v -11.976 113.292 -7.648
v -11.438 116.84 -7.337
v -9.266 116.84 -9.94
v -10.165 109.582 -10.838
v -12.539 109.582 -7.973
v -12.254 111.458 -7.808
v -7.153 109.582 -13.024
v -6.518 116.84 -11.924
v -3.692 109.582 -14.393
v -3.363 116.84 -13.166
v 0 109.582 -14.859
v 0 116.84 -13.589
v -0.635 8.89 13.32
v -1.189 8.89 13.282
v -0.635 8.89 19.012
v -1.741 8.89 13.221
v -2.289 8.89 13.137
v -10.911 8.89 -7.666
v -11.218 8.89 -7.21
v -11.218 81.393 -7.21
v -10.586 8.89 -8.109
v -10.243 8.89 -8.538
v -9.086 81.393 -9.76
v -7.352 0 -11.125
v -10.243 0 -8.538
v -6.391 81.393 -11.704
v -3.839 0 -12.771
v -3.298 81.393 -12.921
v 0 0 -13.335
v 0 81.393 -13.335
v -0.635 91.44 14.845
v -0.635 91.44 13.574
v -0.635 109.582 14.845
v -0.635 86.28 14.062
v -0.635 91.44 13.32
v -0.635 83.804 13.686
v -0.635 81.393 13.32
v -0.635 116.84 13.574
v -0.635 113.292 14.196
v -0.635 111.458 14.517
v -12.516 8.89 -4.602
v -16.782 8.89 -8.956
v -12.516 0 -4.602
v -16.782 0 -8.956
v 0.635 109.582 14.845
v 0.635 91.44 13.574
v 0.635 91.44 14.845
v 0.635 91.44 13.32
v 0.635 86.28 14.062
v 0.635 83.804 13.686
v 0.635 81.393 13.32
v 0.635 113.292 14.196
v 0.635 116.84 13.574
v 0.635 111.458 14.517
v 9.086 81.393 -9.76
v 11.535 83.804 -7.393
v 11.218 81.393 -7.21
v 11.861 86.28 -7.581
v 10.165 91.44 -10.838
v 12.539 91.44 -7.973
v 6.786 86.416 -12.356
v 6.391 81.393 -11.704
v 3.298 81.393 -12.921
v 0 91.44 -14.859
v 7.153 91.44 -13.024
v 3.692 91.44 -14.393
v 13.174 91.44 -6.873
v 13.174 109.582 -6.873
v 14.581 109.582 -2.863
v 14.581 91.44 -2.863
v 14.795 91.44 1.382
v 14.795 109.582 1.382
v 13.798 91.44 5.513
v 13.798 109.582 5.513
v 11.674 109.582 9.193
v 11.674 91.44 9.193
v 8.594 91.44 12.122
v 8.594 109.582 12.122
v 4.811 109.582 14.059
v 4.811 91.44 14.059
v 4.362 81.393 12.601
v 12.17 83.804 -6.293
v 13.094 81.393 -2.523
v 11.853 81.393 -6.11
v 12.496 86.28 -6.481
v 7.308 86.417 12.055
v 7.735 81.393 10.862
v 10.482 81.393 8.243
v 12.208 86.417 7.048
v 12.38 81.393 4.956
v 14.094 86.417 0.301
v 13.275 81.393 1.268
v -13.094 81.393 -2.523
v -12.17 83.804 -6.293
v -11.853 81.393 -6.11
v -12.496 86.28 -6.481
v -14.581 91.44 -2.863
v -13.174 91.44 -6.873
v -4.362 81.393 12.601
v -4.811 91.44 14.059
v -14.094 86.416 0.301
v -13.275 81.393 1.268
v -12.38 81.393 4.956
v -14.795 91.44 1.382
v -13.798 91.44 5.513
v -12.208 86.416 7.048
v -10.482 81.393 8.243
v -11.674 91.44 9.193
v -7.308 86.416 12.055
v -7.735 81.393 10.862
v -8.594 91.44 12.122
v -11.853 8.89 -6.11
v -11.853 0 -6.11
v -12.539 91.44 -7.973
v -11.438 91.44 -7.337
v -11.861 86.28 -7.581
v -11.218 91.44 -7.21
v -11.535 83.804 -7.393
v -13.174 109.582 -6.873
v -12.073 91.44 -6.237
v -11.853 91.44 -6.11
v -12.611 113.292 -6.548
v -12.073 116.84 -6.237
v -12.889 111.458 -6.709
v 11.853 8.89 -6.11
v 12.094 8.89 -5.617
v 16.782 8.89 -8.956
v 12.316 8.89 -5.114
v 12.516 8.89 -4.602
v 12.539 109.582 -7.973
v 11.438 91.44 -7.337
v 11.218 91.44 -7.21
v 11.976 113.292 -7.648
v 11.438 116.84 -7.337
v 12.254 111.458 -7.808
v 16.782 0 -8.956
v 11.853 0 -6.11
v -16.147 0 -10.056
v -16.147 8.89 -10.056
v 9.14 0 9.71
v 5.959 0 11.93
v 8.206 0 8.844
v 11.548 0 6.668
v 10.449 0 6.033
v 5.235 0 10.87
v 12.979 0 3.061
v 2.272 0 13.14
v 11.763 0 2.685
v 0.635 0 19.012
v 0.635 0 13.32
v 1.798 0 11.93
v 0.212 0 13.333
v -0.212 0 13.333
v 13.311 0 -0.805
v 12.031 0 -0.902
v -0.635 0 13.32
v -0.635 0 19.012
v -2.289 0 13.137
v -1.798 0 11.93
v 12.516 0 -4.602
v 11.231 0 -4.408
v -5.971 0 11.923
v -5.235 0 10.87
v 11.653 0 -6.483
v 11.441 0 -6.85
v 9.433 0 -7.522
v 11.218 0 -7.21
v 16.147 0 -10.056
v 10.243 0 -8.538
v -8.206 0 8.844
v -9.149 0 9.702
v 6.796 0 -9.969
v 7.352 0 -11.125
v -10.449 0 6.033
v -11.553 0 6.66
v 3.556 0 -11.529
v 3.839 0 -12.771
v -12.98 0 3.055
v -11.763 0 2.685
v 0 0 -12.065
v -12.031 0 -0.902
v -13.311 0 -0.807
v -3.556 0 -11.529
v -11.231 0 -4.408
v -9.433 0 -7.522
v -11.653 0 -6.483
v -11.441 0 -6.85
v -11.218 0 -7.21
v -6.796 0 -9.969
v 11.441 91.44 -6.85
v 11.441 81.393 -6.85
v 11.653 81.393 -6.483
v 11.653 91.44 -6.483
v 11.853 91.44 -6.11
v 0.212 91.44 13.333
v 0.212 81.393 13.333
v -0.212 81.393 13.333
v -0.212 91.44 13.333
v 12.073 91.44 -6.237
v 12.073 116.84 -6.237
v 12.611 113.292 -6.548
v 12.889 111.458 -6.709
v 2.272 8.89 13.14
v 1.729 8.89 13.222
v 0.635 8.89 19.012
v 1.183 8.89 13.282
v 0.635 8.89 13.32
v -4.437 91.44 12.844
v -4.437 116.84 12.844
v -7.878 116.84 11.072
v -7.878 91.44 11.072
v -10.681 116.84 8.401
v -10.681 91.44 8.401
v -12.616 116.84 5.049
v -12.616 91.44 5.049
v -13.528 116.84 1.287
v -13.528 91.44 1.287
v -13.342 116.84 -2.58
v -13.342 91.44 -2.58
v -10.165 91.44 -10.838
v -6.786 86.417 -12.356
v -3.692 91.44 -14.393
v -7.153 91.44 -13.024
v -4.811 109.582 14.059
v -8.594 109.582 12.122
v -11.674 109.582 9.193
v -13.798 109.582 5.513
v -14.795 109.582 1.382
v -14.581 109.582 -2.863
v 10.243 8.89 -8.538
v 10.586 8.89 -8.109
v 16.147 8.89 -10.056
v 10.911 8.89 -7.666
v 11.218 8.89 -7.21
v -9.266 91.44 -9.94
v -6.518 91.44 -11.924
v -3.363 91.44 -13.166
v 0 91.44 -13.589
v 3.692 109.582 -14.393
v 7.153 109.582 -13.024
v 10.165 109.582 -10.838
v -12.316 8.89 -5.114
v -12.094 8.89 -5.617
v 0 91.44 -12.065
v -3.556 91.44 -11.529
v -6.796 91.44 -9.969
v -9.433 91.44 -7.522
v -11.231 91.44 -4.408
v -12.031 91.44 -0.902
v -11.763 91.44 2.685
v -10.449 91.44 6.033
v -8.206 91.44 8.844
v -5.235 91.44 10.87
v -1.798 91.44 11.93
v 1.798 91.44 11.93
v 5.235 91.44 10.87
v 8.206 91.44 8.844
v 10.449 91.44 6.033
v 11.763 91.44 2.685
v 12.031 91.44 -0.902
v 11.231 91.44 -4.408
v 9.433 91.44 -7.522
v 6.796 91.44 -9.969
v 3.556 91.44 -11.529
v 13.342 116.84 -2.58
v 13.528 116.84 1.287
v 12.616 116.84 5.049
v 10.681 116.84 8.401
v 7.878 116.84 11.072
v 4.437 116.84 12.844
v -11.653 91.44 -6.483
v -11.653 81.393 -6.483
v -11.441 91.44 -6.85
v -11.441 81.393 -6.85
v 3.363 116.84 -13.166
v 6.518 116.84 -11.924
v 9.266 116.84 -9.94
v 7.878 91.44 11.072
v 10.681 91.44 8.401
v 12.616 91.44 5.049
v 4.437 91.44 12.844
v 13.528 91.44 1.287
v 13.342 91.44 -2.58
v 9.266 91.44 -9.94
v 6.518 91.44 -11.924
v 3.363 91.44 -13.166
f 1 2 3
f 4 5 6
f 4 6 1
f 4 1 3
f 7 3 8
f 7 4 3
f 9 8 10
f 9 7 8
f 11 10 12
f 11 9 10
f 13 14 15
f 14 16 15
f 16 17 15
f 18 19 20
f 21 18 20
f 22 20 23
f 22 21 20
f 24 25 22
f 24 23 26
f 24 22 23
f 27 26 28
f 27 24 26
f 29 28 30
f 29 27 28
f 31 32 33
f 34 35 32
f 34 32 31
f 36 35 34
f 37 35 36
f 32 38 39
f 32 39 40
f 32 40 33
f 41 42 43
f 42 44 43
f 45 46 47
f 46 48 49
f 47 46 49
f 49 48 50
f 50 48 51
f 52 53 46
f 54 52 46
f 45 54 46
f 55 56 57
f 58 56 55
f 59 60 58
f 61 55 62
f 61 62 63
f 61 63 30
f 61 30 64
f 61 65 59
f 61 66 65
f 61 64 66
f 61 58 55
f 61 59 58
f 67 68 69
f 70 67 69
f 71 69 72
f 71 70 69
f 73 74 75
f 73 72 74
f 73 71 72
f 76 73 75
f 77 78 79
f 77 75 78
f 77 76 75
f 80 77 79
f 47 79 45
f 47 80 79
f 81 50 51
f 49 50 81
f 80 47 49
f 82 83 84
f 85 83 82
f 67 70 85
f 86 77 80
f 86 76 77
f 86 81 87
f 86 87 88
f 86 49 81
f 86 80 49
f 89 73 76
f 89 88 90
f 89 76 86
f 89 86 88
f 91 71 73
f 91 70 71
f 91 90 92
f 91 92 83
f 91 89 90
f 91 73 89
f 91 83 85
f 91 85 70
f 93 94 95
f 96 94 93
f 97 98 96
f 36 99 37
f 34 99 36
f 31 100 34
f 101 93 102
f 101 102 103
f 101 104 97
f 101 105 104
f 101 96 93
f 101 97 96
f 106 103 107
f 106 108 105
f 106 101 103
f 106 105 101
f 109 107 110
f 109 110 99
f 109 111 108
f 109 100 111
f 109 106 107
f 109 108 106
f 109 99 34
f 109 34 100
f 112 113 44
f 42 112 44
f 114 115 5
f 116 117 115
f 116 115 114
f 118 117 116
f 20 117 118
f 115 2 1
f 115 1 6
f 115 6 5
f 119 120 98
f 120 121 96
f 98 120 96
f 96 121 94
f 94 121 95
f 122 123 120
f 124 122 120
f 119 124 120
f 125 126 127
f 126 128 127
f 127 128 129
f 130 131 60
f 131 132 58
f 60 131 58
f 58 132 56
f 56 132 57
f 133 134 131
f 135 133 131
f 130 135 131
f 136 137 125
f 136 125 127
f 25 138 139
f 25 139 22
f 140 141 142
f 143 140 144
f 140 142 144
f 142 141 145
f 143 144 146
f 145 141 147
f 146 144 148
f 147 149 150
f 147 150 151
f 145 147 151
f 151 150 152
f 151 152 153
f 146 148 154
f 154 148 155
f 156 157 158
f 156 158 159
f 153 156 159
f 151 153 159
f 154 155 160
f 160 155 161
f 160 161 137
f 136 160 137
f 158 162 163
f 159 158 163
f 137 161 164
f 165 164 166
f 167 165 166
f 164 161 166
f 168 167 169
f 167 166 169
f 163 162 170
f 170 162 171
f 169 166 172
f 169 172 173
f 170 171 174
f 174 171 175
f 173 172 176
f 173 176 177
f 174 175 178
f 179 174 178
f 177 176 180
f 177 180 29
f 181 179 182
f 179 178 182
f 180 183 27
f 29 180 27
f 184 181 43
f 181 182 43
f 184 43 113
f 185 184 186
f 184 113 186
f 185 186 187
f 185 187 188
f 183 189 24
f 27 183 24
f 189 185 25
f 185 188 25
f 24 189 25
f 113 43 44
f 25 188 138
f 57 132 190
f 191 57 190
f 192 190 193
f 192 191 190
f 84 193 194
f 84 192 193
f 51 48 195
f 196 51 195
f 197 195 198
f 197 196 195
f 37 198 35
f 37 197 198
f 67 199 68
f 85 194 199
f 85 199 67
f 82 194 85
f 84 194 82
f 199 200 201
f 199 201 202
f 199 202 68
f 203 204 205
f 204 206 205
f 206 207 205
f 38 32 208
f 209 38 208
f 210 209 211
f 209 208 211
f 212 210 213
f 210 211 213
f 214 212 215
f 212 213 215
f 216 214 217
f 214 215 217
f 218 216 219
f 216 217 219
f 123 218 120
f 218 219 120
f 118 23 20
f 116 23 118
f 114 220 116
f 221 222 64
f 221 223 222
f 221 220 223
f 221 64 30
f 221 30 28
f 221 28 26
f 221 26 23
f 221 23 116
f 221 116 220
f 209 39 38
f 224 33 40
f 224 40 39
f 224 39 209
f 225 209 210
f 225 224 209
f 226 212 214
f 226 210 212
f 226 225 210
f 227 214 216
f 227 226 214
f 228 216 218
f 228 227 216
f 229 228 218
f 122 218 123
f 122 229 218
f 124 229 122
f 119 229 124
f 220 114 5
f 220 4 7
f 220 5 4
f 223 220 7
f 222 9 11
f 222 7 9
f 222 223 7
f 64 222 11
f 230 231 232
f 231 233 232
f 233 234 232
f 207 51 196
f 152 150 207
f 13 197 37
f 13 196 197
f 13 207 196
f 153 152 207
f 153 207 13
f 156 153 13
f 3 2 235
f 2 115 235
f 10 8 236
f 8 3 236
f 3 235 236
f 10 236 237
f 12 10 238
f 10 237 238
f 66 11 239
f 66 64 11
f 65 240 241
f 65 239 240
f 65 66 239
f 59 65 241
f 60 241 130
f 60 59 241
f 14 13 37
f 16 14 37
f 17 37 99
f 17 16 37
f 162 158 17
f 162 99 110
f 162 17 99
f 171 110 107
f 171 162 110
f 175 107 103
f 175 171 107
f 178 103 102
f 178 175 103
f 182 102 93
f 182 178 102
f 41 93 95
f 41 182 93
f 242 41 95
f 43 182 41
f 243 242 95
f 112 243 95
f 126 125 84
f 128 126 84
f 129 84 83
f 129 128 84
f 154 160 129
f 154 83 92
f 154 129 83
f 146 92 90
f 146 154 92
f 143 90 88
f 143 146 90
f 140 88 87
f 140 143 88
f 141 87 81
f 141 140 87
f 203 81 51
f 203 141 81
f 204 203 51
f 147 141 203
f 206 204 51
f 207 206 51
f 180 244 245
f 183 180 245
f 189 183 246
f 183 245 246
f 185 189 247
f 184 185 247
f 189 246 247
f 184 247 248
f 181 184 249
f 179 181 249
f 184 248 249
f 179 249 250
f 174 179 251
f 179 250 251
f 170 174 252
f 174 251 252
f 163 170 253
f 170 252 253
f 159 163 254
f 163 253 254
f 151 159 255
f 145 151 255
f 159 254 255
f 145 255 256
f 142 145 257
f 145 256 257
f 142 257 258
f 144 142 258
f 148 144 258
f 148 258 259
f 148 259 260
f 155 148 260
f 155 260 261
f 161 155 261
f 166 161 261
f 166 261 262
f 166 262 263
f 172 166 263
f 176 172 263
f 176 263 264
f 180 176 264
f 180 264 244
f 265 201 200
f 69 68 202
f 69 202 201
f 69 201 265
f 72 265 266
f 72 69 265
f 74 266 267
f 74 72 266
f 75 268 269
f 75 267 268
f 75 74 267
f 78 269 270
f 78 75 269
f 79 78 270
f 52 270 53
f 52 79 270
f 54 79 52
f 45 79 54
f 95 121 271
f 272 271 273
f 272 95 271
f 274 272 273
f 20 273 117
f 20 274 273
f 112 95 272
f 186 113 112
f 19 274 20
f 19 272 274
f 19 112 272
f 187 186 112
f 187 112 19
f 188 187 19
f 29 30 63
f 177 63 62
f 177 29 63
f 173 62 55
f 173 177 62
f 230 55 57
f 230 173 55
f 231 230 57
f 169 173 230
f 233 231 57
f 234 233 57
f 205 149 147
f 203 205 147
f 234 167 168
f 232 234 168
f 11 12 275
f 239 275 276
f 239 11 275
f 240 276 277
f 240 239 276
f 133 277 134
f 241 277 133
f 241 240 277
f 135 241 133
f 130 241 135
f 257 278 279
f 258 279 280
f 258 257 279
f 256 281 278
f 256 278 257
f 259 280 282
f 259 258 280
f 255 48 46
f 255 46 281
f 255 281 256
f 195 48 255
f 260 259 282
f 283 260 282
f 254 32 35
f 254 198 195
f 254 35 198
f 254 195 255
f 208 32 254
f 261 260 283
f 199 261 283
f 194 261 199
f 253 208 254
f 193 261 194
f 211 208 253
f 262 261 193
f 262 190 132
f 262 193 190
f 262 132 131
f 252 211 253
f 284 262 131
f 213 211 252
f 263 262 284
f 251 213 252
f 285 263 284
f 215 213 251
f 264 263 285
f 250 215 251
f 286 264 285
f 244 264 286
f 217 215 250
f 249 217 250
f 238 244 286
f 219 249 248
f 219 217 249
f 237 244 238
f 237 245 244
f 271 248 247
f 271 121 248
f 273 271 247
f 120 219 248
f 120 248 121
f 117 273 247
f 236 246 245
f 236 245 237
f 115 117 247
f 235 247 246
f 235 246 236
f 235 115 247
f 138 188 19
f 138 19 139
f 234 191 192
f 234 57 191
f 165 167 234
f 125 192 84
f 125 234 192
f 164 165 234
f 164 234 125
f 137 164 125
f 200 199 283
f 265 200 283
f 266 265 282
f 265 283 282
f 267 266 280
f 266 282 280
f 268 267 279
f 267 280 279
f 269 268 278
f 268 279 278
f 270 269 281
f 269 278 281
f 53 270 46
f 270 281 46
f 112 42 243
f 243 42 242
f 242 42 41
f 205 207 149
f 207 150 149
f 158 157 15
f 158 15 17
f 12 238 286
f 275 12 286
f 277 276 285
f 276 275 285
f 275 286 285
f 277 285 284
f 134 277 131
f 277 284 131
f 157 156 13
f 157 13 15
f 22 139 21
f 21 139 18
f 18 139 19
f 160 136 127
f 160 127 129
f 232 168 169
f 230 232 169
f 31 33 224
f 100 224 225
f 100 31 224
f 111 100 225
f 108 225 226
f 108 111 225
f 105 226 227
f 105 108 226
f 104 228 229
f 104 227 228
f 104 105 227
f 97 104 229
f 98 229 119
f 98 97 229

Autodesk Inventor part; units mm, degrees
ref_plane "YZ Plane" through (0, 0, 0) normal (1, 0, 0) x (0, 1, 0)
ref_plane "XZ Plane" through (0, 0, 0) normal (0, 1, 0) x (-1, 0, 0)
sketch "Sketch1" plane through (0, 0, 0) normal (1, 0, 0) x (0, 1, 0)
  line L0 (0, 0) -> (0, -12.065)
  line L1 (0, -12.065) -> (91.44, -12.065)
  line L2 (91.44, -13.335) -> (0, -13.335)
  line L3 (0, -13.335) -> (0, -12.065)
  line L4 (0, 0) -> (110.5631, 0)
  line L5 (116.84, 0) -> (116.84, -13.589)
  line L6 (116.84, -13.589) -> (91.44, -13.589)
  line L7 (116.84, -13.589) -> (142.24, -13.589) construction
  line L8 (109.5817, -14.859) -> (91.44, -14.859)
  line L9 (91.44, -14.859) -> (81.393, -13.335)
  line L10 (91.44, -13.589) -> (91.44, -12.065)
  line L11 (116.84, -13.589) -> (109.5817, -14.859)
  point P0 (73.3806, -13.335)
  dimension "d0" = 12.065
  dimension "d1" = 91.44
  dimension "d39" = 13.589
  dimension "d41" = 180
ref_plane "Work Plane1" through (0, 0, 0) normal (0, -1, 0) x (1, 0, 0)
sketch "Sketch2" plane through (0, 0, 0) normal (0, -1, 0) x (1, 0, 0)
  circle A0 centre (0, 0) radius 13.335
  line L0 (11.2178, -7.2099) -> (16.1473, -10.0559)
  line L1 (11.8528, -6.11) -> (16.7823, -8.9561)
  line L2 (0.635, 13.3199) -> (0.635, 19.012)
  line L3 (-0.635, 13.3199) -> (-0.635, 19.012)
  line L4 (-11.8528, -6.11) -> (-16.7823, -8.9561)
  line L5 (-11.2178, -7.2099) -> (-16.1473, -10.0559)
  line L6 (16.1473, -10.0559) -> (16.7823, -8.9561)
  line L7 (0.635, 19.012) -> (-0.635, 19.012)
  line L8 (-16.7823, -8.9561) -> (-16.1473, -10.0559)
  line L9 (-0.635, 19.012) -> (-2.2892, 13.137)
  circle A1 centre (0, 0) radius 13.335 projected
  line L10 (0.635, 19.012) -> (2.2723, 13.14)
  line L11 (16.7823, -8.9561) -> (12.5157, -4.6021)
  line L12 (-16.1473, -10.0559) -> (-10.2434, -8.5379)
  line L13 (-16.7823, -8.9561) -> (-12.5157, -4.6021)
  line L14 (16.1473, -10.0559) -> (10.2434, -8.5379)
  dimension "d24" = 6.096
  dimension "d25" = 6.096
  dimension "d27" = 6.096
  dimension "d28" = 6.096
  dimension "d29" = 6.096
extrude "Extrusion1" add sketch "Sketch2" against normal blind 8.89 contours A0 L2 L10 | L11 L1 A0 | A0 L9 L3 | L0 L14 A0 | A0 L4 L13 | L12 L5 A0
extrude "Extrusion2" cut sketch "Sketch2" against normal blind 124.7775 contours A0 L3 L7 L2 | L1 L6 L0 A0 | A0 L5 L8 L4
revolve "Revolution2" add sketch "Sketch1" angle 360 about axis through (0, 0, 0) along (0, 1, 0)
extrude "Extrusion3" cut sketch "Sketch2" against normal blind 174.625 contours A0 L3 L7 L2 | L1 L6 L0 A0 | A0 L5 L8 L4
properties part number "Engine_Holder_Mk_III" material "ABS Plastic"
